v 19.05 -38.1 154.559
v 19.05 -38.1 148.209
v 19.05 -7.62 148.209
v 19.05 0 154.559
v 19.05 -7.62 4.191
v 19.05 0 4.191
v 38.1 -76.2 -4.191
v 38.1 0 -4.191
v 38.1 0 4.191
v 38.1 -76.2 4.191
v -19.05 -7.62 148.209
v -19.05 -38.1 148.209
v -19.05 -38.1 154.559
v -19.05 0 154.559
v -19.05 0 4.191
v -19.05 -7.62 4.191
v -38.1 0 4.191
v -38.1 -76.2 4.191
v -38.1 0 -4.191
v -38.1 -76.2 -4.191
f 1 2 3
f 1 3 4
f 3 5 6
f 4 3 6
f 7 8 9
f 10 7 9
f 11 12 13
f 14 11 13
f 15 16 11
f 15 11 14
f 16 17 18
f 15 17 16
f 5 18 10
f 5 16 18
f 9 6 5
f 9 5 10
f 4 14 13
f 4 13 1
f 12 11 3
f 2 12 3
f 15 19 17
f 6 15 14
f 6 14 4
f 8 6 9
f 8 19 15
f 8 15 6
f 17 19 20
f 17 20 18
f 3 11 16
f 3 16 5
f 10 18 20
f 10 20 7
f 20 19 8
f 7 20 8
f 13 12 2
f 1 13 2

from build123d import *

# Parameters (mm, degrees)
F0_W     = 76.2
F0_H     = 8.382
F1_DEPTH = 76.2
F2_W     = 38.1
F2_H     = 152.4
F3_DEPTH = 7.62
F4_W     = 38.1
F4_H     = 38.1
F5_DEPTH = 6.35


with BuildPart() as f1:
    # F0 (on Front) → F1 (new body)
    with BuildSketch(Plane.XZ):
        Rectangle(F0_W, F0_H)
    extrude(amount=F1_DEPTH)

    # F2 (on Front) → F3 (join)
    with BuildSketch(Plane.XZ):
        with Locations((0, 72.009)):
            Rectangle(F2_W, F2_H)
    extrude(amount=F3_DEPTH)

    # F4 (on face) → F5 (join)
    with BuildSketch(Plane.XY.offset(148.209)):
        with Locations((0, -19.05)):
            Rectangle(F4_W, F4_H)
    extrude(amount=F5_DEPTH)


solid = f1.part
